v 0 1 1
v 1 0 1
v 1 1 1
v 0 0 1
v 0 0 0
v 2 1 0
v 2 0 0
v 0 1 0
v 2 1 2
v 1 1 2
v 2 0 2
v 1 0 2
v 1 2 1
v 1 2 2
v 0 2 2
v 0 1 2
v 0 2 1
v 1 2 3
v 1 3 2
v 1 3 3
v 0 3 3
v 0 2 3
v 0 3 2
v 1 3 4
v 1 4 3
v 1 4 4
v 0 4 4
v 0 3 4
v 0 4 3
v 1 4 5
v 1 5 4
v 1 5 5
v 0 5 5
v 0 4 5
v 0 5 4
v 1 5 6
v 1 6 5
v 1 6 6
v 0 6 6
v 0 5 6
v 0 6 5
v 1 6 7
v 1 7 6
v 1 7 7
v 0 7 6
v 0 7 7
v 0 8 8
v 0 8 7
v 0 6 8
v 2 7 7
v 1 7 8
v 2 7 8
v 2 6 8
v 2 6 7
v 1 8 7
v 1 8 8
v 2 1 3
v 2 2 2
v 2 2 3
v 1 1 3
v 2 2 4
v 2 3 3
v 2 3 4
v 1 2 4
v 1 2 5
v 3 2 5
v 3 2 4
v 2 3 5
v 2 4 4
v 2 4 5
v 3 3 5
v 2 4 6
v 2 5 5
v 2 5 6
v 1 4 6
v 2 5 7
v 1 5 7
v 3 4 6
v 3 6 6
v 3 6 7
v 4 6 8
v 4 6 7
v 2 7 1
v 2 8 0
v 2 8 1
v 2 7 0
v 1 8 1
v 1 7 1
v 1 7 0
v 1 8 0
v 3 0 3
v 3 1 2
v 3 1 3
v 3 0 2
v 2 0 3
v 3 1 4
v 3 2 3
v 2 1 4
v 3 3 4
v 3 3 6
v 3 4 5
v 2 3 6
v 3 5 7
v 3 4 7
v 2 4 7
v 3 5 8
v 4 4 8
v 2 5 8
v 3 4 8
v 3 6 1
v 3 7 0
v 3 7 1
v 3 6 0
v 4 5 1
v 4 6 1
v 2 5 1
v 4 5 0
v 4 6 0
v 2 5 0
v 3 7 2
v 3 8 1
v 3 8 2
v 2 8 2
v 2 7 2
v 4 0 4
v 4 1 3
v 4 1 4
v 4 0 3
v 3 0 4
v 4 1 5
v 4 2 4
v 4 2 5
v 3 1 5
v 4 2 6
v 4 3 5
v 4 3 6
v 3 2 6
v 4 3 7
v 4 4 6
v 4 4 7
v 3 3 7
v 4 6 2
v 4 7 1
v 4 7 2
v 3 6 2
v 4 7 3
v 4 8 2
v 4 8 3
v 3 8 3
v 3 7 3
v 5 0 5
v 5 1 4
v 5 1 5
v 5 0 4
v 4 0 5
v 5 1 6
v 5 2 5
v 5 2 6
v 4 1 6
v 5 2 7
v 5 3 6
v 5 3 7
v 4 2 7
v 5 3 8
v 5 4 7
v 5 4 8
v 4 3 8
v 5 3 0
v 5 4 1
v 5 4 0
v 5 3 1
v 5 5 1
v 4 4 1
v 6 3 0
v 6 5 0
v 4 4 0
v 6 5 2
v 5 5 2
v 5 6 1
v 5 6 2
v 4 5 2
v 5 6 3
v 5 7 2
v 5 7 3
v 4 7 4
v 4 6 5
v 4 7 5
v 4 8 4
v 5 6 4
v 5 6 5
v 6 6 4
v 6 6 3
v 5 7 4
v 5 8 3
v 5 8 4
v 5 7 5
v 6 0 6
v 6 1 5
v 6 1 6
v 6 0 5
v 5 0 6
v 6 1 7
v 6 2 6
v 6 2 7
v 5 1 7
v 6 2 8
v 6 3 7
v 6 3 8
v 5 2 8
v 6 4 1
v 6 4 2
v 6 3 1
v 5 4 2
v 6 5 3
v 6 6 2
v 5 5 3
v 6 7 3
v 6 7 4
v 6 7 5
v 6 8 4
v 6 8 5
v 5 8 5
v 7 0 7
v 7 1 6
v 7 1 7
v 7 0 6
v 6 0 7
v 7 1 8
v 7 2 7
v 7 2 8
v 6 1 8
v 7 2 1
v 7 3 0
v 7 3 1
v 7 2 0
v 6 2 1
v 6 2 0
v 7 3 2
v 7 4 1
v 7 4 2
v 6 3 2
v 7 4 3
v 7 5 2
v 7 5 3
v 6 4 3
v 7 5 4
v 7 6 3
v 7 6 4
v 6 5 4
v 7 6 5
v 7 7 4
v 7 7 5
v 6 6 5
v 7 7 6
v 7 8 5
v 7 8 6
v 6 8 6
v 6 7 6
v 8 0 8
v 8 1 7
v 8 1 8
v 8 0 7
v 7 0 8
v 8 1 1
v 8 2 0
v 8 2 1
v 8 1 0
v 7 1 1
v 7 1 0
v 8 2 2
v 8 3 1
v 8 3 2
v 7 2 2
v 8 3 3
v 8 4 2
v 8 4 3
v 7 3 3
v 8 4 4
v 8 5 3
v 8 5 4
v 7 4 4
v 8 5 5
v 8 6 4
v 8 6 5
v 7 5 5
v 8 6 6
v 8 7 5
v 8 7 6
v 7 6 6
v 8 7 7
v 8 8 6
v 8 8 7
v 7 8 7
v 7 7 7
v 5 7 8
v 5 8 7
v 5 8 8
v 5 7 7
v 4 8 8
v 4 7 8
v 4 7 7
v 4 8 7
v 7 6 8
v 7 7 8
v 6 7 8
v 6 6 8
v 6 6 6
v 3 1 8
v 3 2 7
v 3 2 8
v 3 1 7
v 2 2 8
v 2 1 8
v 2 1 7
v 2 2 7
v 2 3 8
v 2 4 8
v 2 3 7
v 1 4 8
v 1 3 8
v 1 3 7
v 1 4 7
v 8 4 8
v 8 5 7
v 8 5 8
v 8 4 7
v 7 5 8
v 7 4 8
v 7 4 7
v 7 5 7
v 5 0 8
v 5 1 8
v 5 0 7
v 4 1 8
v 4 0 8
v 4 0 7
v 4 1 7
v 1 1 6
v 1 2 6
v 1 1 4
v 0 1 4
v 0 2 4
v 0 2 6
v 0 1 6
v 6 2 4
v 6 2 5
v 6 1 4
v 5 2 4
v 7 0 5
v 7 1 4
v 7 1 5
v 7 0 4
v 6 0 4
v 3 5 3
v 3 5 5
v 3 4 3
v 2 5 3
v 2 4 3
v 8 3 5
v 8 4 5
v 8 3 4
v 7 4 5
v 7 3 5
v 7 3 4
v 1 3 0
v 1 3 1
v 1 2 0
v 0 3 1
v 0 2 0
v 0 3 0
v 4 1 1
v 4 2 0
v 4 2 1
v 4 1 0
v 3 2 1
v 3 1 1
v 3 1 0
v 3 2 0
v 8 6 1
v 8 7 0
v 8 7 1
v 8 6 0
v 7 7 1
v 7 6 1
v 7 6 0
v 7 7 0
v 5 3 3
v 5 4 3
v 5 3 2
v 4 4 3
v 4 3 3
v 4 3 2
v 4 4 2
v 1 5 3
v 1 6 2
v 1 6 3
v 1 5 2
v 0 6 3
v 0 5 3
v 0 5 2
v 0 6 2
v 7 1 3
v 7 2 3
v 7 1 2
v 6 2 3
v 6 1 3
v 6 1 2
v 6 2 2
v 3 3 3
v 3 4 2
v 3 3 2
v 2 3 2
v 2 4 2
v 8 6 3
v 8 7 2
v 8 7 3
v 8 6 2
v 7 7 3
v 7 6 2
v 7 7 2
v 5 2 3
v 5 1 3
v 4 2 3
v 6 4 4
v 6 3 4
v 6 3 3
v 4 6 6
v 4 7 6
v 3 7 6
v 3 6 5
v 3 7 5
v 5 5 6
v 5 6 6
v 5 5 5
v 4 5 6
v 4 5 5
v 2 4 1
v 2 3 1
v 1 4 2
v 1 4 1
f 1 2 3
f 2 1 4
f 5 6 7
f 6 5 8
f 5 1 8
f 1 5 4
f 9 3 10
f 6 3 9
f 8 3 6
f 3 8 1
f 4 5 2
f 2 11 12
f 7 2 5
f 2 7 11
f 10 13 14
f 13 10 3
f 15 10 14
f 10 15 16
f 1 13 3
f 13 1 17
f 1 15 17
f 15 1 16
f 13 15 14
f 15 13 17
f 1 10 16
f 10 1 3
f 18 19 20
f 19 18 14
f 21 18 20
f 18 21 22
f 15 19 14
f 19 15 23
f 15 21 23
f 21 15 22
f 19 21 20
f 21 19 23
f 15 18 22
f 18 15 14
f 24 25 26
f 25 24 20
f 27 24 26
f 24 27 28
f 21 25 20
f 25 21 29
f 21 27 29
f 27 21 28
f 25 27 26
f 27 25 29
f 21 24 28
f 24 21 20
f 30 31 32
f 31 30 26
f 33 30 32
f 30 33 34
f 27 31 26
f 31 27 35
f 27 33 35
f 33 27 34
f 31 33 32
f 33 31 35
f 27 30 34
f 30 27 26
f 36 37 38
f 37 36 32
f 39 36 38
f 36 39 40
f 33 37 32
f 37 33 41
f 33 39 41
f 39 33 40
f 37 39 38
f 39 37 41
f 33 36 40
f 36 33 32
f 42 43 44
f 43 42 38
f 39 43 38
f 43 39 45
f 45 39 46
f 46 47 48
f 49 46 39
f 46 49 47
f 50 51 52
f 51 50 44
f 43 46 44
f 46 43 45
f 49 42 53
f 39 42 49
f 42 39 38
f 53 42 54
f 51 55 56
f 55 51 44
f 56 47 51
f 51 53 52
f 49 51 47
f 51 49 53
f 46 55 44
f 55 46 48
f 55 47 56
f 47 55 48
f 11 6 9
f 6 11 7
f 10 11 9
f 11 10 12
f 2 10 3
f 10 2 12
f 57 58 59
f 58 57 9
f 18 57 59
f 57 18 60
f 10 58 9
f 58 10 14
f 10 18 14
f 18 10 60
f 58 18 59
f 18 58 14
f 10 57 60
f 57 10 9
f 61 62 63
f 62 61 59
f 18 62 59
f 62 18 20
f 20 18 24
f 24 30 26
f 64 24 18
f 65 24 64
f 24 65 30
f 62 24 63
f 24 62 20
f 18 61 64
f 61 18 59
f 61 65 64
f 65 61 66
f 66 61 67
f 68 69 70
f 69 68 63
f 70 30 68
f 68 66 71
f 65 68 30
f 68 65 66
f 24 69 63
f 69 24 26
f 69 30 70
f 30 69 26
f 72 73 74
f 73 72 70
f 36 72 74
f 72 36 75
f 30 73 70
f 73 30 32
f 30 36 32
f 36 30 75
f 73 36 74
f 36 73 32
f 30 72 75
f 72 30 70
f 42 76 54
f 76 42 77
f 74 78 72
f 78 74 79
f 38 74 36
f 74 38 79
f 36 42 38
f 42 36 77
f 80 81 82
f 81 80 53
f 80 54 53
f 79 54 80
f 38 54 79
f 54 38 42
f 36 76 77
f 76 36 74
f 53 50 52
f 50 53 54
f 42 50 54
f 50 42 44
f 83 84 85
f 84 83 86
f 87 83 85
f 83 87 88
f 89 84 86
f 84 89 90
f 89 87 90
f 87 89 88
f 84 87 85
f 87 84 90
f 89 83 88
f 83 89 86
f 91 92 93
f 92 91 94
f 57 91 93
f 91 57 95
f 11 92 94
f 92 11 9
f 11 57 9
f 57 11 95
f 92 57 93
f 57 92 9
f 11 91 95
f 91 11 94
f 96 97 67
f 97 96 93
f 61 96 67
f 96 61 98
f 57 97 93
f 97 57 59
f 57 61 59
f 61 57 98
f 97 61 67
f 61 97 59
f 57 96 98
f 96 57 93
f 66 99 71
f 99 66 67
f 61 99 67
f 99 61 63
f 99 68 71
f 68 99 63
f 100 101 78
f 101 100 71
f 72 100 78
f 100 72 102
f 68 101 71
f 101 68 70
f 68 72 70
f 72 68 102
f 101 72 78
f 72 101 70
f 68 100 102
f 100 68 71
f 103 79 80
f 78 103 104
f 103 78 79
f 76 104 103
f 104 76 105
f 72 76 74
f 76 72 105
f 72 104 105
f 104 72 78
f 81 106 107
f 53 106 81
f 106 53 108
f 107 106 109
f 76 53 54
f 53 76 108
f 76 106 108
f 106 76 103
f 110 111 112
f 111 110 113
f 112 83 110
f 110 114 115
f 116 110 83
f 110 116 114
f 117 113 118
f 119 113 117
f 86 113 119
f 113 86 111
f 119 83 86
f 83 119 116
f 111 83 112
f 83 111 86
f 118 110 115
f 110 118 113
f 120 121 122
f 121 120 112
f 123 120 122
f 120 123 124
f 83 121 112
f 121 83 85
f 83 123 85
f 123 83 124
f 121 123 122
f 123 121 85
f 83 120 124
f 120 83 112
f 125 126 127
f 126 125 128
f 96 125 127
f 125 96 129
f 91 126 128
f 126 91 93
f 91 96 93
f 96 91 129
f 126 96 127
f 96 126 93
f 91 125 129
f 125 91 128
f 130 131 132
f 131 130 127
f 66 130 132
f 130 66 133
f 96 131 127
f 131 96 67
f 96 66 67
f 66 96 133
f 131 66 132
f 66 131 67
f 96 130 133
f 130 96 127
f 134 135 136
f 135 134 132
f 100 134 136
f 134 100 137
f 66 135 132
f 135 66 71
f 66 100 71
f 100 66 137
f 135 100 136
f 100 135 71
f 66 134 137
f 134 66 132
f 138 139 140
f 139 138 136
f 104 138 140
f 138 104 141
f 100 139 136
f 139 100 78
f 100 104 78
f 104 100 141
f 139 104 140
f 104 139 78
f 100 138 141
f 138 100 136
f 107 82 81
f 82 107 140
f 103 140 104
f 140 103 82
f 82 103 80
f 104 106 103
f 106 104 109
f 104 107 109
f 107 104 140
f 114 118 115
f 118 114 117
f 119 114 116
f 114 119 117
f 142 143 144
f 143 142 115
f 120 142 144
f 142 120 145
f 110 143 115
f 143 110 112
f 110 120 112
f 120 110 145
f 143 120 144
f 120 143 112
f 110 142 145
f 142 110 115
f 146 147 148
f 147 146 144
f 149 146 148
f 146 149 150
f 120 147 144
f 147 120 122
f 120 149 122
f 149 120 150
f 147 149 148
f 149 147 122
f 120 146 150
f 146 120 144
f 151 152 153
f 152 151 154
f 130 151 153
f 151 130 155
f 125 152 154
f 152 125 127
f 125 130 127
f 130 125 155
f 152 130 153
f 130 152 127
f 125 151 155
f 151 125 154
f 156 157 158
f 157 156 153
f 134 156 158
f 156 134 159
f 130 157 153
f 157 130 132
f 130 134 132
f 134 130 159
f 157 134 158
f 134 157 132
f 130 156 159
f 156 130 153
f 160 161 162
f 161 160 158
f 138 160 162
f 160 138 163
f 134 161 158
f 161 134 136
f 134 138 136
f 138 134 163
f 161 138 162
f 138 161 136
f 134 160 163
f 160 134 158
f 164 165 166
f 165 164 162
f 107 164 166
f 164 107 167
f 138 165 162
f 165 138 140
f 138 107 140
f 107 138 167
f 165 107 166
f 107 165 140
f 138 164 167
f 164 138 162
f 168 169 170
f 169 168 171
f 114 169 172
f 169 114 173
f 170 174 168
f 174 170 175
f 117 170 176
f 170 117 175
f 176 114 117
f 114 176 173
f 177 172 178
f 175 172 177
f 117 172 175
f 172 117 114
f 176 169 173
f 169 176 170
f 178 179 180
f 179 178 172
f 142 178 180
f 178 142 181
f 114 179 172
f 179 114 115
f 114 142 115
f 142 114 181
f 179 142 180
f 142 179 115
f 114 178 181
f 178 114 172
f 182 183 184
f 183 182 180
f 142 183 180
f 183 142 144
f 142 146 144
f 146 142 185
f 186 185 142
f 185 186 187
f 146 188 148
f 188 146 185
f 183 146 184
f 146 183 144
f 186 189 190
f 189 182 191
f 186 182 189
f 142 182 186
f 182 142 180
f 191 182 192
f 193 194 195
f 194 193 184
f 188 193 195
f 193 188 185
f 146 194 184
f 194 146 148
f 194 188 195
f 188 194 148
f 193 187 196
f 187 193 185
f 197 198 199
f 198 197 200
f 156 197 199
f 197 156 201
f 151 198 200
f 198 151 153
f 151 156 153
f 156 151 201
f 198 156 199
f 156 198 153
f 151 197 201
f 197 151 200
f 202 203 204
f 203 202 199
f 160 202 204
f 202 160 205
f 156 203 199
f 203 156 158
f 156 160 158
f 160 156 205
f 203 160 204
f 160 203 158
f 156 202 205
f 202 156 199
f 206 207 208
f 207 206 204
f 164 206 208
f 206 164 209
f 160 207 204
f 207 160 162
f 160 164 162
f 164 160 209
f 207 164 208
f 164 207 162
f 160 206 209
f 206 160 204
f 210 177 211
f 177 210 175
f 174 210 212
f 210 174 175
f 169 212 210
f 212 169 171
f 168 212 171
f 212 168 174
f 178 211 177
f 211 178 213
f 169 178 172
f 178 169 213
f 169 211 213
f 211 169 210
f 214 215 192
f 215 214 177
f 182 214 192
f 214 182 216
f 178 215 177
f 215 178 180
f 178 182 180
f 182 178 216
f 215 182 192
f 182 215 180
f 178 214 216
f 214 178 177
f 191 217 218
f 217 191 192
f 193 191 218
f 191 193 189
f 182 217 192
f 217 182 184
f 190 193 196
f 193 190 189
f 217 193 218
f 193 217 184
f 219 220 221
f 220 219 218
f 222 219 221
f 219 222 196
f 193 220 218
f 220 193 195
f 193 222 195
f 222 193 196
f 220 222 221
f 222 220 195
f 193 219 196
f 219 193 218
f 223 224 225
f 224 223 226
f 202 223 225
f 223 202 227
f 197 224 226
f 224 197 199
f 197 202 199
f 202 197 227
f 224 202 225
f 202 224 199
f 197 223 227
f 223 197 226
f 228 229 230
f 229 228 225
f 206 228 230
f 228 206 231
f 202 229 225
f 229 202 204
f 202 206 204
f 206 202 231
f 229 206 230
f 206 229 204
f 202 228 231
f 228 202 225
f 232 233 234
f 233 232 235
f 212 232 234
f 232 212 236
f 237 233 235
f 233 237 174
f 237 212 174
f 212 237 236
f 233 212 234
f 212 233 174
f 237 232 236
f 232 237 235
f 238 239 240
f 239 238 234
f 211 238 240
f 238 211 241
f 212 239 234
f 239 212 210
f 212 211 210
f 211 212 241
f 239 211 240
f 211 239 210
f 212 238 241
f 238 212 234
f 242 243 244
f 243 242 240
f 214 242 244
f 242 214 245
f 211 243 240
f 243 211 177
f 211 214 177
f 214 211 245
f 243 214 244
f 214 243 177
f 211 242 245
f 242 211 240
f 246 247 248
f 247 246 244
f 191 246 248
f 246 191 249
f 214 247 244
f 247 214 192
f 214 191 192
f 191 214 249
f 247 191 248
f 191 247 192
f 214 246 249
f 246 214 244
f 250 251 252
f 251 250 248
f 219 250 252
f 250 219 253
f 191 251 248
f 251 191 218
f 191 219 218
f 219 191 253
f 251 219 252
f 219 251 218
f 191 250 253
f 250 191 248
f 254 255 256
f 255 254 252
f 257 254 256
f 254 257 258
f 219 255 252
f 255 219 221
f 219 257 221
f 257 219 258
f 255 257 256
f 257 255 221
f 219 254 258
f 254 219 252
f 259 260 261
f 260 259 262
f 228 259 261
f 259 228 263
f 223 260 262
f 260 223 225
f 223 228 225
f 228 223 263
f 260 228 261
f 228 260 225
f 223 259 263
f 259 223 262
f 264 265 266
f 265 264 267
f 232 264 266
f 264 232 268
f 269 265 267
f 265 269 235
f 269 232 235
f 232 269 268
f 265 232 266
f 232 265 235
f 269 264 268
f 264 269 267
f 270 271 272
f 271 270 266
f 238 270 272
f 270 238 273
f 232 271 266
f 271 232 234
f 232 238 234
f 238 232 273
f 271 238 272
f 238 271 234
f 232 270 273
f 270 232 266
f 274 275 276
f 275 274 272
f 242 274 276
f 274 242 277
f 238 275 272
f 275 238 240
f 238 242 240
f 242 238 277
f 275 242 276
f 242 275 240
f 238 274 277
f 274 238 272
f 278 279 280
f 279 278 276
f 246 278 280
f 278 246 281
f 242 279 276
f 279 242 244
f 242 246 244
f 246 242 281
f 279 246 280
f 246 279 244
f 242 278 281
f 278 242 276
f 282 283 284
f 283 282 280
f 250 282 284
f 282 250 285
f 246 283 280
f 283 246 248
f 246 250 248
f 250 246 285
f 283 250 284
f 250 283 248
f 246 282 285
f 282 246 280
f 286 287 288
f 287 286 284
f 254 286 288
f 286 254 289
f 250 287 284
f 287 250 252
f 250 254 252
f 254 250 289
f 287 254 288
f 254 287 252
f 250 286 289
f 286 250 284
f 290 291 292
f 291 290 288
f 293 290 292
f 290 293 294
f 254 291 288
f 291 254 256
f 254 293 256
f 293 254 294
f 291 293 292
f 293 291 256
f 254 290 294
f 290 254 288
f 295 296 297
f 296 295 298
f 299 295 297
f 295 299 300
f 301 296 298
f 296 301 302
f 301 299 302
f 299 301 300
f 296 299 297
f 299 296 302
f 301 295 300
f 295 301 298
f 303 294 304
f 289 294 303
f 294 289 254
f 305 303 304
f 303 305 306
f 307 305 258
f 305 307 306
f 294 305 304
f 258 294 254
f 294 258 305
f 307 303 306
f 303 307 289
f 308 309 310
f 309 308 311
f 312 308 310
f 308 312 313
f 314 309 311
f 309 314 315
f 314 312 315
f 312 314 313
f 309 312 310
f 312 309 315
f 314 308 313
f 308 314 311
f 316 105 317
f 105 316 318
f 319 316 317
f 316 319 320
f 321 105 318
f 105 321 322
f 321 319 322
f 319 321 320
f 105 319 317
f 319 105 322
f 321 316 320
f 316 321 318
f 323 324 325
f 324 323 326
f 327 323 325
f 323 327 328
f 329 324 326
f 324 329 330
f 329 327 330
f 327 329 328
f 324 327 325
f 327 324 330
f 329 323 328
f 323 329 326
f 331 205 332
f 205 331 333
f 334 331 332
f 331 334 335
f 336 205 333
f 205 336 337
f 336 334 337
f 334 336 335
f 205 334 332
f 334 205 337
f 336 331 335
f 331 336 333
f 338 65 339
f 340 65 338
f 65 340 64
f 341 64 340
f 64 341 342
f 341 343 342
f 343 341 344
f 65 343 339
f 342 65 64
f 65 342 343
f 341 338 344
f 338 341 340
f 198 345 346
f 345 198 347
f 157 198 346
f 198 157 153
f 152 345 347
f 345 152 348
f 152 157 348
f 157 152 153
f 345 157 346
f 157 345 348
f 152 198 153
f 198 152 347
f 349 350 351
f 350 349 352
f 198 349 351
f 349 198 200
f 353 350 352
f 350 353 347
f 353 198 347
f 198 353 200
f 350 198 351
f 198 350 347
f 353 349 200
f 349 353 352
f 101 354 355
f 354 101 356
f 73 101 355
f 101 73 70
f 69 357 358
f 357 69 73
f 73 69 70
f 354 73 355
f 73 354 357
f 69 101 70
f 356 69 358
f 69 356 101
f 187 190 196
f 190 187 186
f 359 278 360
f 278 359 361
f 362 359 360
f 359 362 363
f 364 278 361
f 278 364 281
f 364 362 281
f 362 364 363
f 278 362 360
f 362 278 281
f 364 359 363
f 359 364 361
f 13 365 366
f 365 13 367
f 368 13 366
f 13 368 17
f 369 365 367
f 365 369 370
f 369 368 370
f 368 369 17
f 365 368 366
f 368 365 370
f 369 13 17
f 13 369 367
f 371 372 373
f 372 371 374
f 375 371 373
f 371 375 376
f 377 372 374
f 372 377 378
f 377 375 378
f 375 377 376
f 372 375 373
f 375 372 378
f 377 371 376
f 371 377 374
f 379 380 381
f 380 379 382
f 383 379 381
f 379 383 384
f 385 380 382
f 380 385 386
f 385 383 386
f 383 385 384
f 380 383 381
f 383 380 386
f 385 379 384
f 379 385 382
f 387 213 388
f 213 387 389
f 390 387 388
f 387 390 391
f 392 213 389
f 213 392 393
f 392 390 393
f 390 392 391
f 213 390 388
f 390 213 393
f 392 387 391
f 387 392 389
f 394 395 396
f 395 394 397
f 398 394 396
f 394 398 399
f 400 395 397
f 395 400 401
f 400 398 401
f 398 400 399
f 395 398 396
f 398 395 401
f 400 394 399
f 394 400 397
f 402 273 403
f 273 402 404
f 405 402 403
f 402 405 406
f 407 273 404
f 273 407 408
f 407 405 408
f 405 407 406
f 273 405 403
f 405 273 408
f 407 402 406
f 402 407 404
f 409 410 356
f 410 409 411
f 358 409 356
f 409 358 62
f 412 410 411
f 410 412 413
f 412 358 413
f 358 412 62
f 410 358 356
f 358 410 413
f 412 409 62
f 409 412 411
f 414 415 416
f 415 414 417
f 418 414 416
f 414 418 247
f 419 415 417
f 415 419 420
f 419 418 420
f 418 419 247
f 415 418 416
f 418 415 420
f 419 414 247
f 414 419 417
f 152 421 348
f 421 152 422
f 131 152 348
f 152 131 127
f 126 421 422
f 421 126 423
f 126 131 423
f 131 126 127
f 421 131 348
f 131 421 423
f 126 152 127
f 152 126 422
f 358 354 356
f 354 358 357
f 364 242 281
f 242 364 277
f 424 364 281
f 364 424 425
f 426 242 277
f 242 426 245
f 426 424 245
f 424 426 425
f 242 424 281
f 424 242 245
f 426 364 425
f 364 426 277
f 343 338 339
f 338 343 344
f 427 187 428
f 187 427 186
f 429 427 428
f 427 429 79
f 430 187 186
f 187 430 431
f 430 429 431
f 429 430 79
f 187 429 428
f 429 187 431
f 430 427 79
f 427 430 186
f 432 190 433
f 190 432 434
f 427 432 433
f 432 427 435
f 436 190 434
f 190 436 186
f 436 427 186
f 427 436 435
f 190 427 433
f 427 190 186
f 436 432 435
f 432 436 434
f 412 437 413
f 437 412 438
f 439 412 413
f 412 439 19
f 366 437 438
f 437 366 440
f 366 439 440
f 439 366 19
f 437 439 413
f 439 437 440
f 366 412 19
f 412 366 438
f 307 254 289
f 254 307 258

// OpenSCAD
union() {
    translate([0, 0, 0]) cube([1, 1, 1]);
    translate([0, 1, 1]) cube([1, 1, 1]);
    translate([0, 2, 2]) cube([1, 1, 1]);
    translate([0, 3, 3]) cube([1, 1, 1]);
    translate([0, 4, 4]) cube([1, 1, 1]);
    translate([0, 5, 5]) cube([1, 1, 1]);
    translate([0, 6, 6]) cube([1, 1, 1]);
    translate([0, 7, 7]) cube([1, 1, 1]);
    translate([1, 0, 1]) cube([1, 1, 1]);
    translate([1, 1, 2]) cube([1, 1, 1]);
    translate([1, 2, 3]) cube([1, 1, 1]);
    translate([1, 3, 4]) cube([1, 1, 1]);
    translate([1, 4, 5]) cube([1, 1, 1]);
    translate([1, 5, 6]) cube([1, 1, 1]);
    translate([1, 6, 7]) cube([1, 1, 1]);
    translate([1, 7, 0]) cube([1, 1, 1]);
    translate([2, 0, 2]) cube([1, 1, 1]);
    translate([2, 1, 3]) cube([1, 1, 1]);
    translate([2, 2, 4]) cube([1, 1, 1]);
    translate([2, 3, 5]) cube([1, 1, 1]);
    translate([2, 4, 6]) cube([1, 1, 1]);
    translate([2, 5, 7]) cube([1, 1, 1]);
    translate([2, 6, 0]) cube([1, 1, 1]);
    translate([2, 7, 1]) cube([1, 1, 1]);
    translate([3, 0, 3]) cube([1, 1, 1]);
    translate([3, 1, 4]) cube([1, 1, 1]);
    translate([3, 2, 5]) cube([1, 1, 1]);
    translate([3, 3, 6]) cube([1, 1, 1]);
    translate([3, 4, 7]) cube([1, 1, 1]);
    translate([3, 5, 0]) cube([1, 1, 1]);
    translate([3, 6, 1]) cube([1, 1, 1]);
    translate([3, 7, 2]) cube([1, 1, 1]);
    translate([4, 0, 4]) cube([1, 1, 1]);
    translate([4, 1, 5]) cube([1, 1, 1]);
    translate([4, 2, 6]) cube([1, 1, 1]);
    translate([4, 3, 7]) cube([1, 1, 1]);
    translate([4, 4, 0]) cube([1, 1, 1]);
    translate([4, 5, 1]) cube([1, 1, 1]);
    translate([4, 6, 2]) cube([1, 1, 1]);
    translate([4, 7, 3]) cube([1, 1, 1]);
    translate([5, 0, 5]) cube([1, 1, 1]);
    translate([5, 1, 6]) cube([1, 1, 1]);
    translate([5, 2, 7]) cube([1, 1, 1]);
    translate([5, 3, 0]) cube([1, 1, 1]);
    translate([5, 4, 1]) cube([1, 1, 1]);
    translate([5, 5, 2]) cube([1, 1, 1]);
    translate([5, 6, 3]) cube([1, 1, 1]);
    translate([5, 7, 4]) cube([1, 1, 1]);
    translate([6, 0, 6]) cube([1, 1, 1]);
    translate([6, 1, 7]) cube([1, 1, 1]);
    translate([6, 2, 0]) cube([1, 1, 1]);
    translate([6, 3, 1]) cube([1, 1, 1]);
    translate([6, 4, 2]) cube([1, 1, 1]);
    translate([6, 5, 3]) cube([1, 1, 1]);
    translate([6, 6, 4]) cube([1, 1, 1]);
    translate([6, 7, 5]) cube([1, 1, 1]);
    translate([7, 0, 7]) cube([1, 1, 1]);
    translate([7, 1, 0]) cube([1, 1, 1]);
    translate([7, 2, 1]) cube([1, 1, 1]);
    translate([7, 3, 2]) cube([1, 1, 1]);
    translate([7, 4, 3]) cube([1, 1, 1]);
    translate([7, 5, 4]) cube([1, 1, 1]);
    translate([7, 6, 5]) cube([1, 1, 1]);
    translate([7, 7, 6]) cube([1, 1, 1]);
    translate([4, 7, 7]) cube([1, 1, 1]);
    translate([6, 6, 7]) cube([1, 1, 1]);
    translate([0, 6, 7]) cube([1, 1, 1]);
    translate([2, 1, 7]) cube([1, 1, 1]);
    translate([1, 3, 7]) cube([1, 1, 1]);
    translate([7, 4, 7]) cube([1, 1, 1]);
    translate([3, 5, 7]) cube([1, 1, 1]);
    translate([4, 0, 7]) cube([1, 1, 1]);
    translate([0, 1, 4]) cube([1, 1, 1]);
    translate([5, 1, 4]) cube([1, 1, 1]);
    translate([1, 2, 4]) cube([1, 1, 1]);
    translate([6, 0, 4]) cube([1, 1, 1]);
    translate([2, 4, 4]) cube([1, 1, 1]);
    translate([4, 6, 4]) cube([1, 1, 1]);
    translate([7, 3, 4]) cube([1, 1, 1]);
    translate([0, 2, 0]) cube([1, 1, 1]);
    translate([1, 0, 0]) cube([1, 1, 1]);
    translate([3, 1, 0]) cube([1, 1, 1]);
    translate([5, 4, 0]) cube([1, 1, 1]);
    translate([2, 5, 0]) cube([1, 1, 1]);
    translate([7, 6, 0]) cube([1, 1, 1]);
    translate([4, 3, 2]) cube([1, 1, 1]);
    translate([0, 5, 2]) cube([1, 1, 1]);
    translate([6, 1, 2]) cube([1, 1, 1]);
    translate([2, 3, 2]) cube([1, 1, 1]);
    translate([7, 6, 2]) cube([1, 1, 1]);
    translate([4, 1, 3]) cube([1, 1, 1]);
    translate([2, 4, 3]) cube([1, 1, 1]);
    translate([6, 3, 3]) cube([1, 1, 1]);
    translate([4, 6, 3]) cube([1, 1, 1]);
    translate([0, 1, 5]) cube([1, 1, 1]);
    translate([3, 6, 5]) cube([1, 1, 1]);
    translate([4, 5, 5]) cube([1, 1, 1]);
    translate([1, 3, 1]) cube([1, 1, 1]);
    translate([2, 5, 6]) cube([1, 1, 1]);
    translate([6, 6, 6]) cube([1, 1, 1]);
}
